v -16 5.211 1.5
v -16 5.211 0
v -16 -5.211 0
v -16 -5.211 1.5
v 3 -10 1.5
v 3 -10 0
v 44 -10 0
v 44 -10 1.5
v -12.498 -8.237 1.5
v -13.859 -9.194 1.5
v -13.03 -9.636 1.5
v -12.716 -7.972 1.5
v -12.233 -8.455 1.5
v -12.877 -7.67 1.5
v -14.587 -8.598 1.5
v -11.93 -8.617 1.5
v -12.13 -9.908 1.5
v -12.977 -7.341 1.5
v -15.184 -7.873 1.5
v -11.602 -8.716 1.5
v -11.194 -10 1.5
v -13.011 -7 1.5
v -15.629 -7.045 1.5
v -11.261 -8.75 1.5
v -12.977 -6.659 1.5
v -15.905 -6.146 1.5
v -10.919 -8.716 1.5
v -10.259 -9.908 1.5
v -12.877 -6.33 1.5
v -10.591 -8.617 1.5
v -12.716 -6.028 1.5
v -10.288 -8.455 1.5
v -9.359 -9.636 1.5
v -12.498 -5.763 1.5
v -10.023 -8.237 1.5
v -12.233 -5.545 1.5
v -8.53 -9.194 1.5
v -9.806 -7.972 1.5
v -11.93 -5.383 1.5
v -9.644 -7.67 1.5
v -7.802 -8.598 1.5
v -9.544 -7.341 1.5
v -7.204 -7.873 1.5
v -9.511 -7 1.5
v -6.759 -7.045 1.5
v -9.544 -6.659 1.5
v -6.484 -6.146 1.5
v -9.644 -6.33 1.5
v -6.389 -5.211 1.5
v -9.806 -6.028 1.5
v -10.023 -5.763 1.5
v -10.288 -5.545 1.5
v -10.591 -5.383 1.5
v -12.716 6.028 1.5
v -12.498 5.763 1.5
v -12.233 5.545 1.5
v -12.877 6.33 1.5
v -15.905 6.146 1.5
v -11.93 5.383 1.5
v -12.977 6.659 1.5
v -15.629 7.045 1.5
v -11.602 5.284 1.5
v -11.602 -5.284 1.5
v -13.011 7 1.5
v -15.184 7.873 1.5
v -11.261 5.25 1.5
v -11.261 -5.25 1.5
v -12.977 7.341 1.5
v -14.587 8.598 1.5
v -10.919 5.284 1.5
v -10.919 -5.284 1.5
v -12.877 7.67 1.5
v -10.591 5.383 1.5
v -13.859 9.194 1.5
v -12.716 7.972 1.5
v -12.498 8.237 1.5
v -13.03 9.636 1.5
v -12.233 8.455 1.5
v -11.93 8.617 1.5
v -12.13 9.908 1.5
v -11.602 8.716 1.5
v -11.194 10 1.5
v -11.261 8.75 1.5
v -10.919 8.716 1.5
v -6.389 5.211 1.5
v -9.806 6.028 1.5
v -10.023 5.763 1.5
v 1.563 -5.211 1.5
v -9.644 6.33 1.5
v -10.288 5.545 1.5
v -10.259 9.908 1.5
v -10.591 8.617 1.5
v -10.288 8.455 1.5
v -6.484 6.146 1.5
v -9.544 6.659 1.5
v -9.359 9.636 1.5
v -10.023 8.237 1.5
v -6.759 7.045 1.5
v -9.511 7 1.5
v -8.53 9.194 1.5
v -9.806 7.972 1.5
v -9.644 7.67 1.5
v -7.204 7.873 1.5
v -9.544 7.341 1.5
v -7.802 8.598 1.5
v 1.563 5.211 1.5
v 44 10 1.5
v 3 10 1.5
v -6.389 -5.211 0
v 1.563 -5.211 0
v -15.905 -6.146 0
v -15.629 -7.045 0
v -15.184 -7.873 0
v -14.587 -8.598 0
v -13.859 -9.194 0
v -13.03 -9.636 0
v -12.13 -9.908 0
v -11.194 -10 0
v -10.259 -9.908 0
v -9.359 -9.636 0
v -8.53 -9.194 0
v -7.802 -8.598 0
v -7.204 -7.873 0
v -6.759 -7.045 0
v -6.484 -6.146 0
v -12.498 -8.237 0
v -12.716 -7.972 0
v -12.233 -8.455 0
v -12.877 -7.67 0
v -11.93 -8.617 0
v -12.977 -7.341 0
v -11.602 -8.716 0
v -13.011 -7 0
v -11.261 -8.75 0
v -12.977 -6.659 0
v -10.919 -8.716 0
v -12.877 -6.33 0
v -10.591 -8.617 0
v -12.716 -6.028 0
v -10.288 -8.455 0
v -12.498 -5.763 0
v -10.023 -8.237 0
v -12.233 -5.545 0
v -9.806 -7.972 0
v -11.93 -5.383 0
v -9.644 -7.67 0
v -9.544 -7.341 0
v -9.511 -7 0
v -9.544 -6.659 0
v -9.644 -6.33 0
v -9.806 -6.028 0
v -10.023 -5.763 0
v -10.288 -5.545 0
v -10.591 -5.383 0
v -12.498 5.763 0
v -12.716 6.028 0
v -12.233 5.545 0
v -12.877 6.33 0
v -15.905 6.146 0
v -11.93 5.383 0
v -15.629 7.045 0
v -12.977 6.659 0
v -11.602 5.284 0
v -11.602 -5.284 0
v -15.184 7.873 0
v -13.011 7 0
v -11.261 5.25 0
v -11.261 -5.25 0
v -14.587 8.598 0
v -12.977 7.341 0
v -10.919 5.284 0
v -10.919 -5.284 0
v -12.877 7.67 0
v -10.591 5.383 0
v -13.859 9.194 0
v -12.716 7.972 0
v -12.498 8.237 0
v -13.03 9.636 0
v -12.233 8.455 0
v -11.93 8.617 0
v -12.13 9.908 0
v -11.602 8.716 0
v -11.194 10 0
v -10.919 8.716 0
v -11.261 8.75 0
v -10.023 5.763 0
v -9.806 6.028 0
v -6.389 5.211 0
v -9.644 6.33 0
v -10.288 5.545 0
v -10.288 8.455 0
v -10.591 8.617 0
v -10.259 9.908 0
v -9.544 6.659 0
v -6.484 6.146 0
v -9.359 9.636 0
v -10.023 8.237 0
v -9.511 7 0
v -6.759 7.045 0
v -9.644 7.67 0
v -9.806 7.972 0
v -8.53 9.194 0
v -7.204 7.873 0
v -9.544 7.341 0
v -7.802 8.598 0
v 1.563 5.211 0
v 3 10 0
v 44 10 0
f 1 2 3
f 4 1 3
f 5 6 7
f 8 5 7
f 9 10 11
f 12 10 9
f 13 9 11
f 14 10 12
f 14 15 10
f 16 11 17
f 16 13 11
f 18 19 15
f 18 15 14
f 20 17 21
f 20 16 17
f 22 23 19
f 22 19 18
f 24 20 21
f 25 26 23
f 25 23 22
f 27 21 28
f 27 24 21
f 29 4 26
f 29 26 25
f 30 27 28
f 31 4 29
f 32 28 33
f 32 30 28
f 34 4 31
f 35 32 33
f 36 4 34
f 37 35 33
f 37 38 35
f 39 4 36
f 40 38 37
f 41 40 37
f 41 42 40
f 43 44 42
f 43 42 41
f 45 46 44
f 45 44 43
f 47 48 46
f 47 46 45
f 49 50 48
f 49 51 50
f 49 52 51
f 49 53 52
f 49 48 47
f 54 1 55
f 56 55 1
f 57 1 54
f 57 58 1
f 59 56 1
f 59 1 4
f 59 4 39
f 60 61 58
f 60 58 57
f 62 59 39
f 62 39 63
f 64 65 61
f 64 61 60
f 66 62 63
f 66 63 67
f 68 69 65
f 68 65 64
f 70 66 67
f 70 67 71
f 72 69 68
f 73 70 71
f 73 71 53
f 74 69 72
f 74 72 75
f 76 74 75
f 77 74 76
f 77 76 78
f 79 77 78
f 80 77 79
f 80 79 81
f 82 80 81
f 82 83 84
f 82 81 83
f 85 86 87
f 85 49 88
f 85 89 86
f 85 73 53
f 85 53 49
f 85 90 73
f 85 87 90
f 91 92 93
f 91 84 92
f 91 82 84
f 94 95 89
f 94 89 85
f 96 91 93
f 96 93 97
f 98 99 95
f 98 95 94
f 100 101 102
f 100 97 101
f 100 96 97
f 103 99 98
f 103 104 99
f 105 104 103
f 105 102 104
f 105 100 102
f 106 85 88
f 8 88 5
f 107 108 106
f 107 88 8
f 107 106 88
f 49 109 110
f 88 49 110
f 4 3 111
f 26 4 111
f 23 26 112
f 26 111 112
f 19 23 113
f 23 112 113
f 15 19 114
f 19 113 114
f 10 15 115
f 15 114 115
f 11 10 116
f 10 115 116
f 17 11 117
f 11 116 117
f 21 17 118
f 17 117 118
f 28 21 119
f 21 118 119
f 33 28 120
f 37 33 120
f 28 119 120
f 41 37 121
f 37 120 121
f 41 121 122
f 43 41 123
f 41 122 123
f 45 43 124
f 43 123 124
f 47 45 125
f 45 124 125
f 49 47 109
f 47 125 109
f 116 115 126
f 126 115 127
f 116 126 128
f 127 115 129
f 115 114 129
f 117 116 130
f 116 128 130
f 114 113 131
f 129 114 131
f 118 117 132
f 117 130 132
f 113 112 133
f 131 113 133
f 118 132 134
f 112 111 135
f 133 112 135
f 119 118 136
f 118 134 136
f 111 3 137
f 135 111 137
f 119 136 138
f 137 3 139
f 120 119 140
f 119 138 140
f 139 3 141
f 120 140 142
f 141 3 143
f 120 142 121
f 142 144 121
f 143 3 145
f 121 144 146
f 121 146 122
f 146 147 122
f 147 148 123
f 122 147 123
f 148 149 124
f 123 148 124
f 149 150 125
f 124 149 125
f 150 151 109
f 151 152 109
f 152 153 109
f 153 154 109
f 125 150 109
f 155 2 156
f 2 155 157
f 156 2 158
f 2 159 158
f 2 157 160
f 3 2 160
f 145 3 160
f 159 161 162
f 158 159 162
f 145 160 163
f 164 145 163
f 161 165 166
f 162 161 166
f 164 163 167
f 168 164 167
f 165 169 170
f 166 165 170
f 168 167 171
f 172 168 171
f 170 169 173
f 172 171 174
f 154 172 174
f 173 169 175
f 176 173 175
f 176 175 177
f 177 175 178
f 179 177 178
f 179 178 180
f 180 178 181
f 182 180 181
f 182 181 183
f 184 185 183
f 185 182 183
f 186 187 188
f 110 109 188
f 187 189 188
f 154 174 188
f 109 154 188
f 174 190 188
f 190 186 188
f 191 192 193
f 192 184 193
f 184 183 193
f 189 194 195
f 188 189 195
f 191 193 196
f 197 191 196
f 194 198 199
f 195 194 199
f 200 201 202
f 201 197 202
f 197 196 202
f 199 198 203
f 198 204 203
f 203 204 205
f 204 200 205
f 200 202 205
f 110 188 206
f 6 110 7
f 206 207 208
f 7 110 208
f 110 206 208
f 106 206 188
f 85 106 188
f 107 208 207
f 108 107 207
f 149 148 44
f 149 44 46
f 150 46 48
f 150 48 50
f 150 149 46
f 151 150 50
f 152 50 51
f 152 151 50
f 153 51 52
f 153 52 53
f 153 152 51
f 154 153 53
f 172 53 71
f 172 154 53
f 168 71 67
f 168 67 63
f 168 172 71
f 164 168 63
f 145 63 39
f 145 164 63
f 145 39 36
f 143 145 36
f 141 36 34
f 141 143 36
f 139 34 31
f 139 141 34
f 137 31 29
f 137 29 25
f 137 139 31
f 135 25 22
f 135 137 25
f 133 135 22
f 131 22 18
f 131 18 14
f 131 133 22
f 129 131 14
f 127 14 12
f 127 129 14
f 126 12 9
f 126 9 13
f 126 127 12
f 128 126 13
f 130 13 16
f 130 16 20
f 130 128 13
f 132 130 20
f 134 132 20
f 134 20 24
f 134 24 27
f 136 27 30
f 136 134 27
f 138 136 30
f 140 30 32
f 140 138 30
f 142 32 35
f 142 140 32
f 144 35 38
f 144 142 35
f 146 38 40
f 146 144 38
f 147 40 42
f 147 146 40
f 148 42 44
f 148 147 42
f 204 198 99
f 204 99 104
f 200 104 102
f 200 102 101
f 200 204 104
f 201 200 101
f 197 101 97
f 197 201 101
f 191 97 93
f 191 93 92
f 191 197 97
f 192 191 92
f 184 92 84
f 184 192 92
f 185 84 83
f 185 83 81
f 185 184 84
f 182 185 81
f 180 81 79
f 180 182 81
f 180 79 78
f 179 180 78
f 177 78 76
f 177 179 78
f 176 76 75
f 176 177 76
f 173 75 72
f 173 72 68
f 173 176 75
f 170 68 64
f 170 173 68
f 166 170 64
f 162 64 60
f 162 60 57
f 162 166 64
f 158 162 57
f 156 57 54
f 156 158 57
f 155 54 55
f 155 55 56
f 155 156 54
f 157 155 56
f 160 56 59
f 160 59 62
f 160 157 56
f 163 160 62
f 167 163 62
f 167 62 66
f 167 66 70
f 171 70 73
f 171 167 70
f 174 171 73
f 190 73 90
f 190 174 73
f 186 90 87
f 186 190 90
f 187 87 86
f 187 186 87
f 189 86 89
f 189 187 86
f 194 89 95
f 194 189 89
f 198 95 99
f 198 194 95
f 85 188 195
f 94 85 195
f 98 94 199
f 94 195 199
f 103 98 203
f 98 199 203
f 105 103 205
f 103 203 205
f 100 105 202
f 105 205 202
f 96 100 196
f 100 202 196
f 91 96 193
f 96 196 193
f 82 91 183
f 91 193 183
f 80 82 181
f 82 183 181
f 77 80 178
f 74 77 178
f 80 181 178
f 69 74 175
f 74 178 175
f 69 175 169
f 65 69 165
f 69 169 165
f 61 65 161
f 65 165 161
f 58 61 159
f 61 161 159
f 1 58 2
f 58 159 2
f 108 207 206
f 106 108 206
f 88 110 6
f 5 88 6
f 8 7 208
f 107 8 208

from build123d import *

# Parameters (mm, degrees)
SKETCH1_R           = 1.75
BOSS_EXTRUDE1_DEPTH = 1.5


with BuildPart() as part:
    # Sketch1 → Boss-Extrude1 (new body)
    # profile 1 of 3: a face of its own
    with BuildSketch(Plane.XY):
        Polygon((44, 0), (0, 0), (1.563260572, -5.210868574), (3, -10), (44, -10), align=None)
    # profile 2 of 3: a face of its own
    with BuildSketch(Plane.XY):
        Polygon((1.563260572, 5.210868574), (0, 0), (44, 0), (44, 10), (3, 10), align=None)
    # profile 3 of 3: a face of its own
    with BuildSketch(Plane.XY):
        with BuildLine():
            Line((1.563260572, -5.210868574), (0, 0))
            Line((0, 0), (1.563260572, 5.210868574))
            Line((1.563260572, 5.210868574), (-6.388542044, 5.210868574))
            ThreePointArc((-6.388542044, 5.210868574), (-11.194271022, 10), (-16, 5.210868574))
            Line((-16, 5.210868574), (-16, -5.210868574))
            ThreePointArc((-16, -5.210868574), (-11.194271022, -10), (-6.388542044, -5.210868574))
            Line((-6.388542044, -5.210868574), (1.563260572, -5.210868574))
        make_face()
        with Locations((-11.260632468, -7)):
            Circle(SKETCH1_R, mode=Mode.SUBTRACT)
        with Locations((-11.260632468, 7)):
            Circle(SKETCH1_R, mode=Mode.SUBTRACT)
    extrude(amount=BOSS_EXTRUDE1_DEPTH)


solid = part.part
